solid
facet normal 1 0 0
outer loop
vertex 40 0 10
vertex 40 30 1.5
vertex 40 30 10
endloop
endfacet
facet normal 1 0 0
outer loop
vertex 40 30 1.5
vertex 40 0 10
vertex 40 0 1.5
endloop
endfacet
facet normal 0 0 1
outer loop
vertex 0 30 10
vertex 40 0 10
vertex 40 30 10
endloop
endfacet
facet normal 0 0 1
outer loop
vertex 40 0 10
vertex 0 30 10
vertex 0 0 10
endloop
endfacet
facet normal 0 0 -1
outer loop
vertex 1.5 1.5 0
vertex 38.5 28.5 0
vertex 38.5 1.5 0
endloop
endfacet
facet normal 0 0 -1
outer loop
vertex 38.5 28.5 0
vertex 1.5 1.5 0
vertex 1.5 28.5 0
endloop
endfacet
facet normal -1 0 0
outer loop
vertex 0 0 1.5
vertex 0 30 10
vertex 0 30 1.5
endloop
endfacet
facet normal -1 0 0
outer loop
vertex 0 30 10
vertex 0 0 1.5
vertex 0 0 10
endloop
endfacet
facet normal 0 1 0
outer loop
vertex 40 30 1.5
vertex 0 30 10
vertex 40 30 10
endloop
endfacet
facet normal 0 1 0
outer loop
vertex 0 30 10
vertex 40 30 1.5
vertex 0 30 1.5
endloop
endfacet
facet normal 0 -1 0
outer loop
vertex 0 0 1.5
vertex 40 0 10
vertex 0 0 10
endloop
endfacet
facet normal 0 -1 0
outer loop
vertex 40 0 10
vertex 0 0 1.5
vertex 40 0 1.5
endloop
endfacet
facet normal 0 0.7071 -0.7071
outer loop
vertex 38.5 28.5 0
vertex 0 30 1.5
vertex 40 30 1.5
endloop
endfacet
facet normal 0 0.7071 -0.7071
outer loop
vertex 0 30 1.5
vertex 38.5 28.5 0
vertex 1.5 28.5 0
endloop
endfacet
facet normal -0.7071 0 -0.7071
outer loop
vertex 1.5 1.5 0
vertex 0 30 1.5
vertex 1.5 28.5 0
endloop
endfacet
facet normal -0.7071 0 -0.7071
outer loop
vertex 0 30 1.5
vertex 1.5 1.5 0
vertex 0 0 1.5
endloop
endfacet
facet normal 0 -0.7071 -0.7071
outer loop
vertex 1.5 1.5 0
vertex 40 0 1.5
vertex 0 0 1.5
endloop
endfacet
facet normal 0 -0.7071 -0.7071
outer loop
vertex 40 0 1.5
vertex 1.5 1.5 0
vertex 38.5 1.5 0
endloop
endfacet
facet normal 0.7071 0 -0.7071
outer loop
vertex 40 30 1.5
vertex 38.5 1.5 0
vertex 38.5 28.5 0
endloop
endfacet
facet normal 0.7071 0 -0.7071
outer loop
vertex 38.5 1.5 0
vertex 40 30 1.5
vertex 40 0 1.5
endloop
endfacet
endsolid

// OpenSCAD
// units=mm — generated by scad_emitter.py
// part=unnamed
$fn = 48;

intersection() { cube([40, 30, 10]); hull() { translate([1.5, 1.5, 0]) linear_extrude(height=0.01) offset(r=0) square([37, 27]); translate([0, 0, 1.5]) linear_extrude(height=0.01) offset(r=0) square([40, 30]); translate([0, 0, 10]) linear_extrude(height=0.01) offset(r=0) square([40, 30]); } }
